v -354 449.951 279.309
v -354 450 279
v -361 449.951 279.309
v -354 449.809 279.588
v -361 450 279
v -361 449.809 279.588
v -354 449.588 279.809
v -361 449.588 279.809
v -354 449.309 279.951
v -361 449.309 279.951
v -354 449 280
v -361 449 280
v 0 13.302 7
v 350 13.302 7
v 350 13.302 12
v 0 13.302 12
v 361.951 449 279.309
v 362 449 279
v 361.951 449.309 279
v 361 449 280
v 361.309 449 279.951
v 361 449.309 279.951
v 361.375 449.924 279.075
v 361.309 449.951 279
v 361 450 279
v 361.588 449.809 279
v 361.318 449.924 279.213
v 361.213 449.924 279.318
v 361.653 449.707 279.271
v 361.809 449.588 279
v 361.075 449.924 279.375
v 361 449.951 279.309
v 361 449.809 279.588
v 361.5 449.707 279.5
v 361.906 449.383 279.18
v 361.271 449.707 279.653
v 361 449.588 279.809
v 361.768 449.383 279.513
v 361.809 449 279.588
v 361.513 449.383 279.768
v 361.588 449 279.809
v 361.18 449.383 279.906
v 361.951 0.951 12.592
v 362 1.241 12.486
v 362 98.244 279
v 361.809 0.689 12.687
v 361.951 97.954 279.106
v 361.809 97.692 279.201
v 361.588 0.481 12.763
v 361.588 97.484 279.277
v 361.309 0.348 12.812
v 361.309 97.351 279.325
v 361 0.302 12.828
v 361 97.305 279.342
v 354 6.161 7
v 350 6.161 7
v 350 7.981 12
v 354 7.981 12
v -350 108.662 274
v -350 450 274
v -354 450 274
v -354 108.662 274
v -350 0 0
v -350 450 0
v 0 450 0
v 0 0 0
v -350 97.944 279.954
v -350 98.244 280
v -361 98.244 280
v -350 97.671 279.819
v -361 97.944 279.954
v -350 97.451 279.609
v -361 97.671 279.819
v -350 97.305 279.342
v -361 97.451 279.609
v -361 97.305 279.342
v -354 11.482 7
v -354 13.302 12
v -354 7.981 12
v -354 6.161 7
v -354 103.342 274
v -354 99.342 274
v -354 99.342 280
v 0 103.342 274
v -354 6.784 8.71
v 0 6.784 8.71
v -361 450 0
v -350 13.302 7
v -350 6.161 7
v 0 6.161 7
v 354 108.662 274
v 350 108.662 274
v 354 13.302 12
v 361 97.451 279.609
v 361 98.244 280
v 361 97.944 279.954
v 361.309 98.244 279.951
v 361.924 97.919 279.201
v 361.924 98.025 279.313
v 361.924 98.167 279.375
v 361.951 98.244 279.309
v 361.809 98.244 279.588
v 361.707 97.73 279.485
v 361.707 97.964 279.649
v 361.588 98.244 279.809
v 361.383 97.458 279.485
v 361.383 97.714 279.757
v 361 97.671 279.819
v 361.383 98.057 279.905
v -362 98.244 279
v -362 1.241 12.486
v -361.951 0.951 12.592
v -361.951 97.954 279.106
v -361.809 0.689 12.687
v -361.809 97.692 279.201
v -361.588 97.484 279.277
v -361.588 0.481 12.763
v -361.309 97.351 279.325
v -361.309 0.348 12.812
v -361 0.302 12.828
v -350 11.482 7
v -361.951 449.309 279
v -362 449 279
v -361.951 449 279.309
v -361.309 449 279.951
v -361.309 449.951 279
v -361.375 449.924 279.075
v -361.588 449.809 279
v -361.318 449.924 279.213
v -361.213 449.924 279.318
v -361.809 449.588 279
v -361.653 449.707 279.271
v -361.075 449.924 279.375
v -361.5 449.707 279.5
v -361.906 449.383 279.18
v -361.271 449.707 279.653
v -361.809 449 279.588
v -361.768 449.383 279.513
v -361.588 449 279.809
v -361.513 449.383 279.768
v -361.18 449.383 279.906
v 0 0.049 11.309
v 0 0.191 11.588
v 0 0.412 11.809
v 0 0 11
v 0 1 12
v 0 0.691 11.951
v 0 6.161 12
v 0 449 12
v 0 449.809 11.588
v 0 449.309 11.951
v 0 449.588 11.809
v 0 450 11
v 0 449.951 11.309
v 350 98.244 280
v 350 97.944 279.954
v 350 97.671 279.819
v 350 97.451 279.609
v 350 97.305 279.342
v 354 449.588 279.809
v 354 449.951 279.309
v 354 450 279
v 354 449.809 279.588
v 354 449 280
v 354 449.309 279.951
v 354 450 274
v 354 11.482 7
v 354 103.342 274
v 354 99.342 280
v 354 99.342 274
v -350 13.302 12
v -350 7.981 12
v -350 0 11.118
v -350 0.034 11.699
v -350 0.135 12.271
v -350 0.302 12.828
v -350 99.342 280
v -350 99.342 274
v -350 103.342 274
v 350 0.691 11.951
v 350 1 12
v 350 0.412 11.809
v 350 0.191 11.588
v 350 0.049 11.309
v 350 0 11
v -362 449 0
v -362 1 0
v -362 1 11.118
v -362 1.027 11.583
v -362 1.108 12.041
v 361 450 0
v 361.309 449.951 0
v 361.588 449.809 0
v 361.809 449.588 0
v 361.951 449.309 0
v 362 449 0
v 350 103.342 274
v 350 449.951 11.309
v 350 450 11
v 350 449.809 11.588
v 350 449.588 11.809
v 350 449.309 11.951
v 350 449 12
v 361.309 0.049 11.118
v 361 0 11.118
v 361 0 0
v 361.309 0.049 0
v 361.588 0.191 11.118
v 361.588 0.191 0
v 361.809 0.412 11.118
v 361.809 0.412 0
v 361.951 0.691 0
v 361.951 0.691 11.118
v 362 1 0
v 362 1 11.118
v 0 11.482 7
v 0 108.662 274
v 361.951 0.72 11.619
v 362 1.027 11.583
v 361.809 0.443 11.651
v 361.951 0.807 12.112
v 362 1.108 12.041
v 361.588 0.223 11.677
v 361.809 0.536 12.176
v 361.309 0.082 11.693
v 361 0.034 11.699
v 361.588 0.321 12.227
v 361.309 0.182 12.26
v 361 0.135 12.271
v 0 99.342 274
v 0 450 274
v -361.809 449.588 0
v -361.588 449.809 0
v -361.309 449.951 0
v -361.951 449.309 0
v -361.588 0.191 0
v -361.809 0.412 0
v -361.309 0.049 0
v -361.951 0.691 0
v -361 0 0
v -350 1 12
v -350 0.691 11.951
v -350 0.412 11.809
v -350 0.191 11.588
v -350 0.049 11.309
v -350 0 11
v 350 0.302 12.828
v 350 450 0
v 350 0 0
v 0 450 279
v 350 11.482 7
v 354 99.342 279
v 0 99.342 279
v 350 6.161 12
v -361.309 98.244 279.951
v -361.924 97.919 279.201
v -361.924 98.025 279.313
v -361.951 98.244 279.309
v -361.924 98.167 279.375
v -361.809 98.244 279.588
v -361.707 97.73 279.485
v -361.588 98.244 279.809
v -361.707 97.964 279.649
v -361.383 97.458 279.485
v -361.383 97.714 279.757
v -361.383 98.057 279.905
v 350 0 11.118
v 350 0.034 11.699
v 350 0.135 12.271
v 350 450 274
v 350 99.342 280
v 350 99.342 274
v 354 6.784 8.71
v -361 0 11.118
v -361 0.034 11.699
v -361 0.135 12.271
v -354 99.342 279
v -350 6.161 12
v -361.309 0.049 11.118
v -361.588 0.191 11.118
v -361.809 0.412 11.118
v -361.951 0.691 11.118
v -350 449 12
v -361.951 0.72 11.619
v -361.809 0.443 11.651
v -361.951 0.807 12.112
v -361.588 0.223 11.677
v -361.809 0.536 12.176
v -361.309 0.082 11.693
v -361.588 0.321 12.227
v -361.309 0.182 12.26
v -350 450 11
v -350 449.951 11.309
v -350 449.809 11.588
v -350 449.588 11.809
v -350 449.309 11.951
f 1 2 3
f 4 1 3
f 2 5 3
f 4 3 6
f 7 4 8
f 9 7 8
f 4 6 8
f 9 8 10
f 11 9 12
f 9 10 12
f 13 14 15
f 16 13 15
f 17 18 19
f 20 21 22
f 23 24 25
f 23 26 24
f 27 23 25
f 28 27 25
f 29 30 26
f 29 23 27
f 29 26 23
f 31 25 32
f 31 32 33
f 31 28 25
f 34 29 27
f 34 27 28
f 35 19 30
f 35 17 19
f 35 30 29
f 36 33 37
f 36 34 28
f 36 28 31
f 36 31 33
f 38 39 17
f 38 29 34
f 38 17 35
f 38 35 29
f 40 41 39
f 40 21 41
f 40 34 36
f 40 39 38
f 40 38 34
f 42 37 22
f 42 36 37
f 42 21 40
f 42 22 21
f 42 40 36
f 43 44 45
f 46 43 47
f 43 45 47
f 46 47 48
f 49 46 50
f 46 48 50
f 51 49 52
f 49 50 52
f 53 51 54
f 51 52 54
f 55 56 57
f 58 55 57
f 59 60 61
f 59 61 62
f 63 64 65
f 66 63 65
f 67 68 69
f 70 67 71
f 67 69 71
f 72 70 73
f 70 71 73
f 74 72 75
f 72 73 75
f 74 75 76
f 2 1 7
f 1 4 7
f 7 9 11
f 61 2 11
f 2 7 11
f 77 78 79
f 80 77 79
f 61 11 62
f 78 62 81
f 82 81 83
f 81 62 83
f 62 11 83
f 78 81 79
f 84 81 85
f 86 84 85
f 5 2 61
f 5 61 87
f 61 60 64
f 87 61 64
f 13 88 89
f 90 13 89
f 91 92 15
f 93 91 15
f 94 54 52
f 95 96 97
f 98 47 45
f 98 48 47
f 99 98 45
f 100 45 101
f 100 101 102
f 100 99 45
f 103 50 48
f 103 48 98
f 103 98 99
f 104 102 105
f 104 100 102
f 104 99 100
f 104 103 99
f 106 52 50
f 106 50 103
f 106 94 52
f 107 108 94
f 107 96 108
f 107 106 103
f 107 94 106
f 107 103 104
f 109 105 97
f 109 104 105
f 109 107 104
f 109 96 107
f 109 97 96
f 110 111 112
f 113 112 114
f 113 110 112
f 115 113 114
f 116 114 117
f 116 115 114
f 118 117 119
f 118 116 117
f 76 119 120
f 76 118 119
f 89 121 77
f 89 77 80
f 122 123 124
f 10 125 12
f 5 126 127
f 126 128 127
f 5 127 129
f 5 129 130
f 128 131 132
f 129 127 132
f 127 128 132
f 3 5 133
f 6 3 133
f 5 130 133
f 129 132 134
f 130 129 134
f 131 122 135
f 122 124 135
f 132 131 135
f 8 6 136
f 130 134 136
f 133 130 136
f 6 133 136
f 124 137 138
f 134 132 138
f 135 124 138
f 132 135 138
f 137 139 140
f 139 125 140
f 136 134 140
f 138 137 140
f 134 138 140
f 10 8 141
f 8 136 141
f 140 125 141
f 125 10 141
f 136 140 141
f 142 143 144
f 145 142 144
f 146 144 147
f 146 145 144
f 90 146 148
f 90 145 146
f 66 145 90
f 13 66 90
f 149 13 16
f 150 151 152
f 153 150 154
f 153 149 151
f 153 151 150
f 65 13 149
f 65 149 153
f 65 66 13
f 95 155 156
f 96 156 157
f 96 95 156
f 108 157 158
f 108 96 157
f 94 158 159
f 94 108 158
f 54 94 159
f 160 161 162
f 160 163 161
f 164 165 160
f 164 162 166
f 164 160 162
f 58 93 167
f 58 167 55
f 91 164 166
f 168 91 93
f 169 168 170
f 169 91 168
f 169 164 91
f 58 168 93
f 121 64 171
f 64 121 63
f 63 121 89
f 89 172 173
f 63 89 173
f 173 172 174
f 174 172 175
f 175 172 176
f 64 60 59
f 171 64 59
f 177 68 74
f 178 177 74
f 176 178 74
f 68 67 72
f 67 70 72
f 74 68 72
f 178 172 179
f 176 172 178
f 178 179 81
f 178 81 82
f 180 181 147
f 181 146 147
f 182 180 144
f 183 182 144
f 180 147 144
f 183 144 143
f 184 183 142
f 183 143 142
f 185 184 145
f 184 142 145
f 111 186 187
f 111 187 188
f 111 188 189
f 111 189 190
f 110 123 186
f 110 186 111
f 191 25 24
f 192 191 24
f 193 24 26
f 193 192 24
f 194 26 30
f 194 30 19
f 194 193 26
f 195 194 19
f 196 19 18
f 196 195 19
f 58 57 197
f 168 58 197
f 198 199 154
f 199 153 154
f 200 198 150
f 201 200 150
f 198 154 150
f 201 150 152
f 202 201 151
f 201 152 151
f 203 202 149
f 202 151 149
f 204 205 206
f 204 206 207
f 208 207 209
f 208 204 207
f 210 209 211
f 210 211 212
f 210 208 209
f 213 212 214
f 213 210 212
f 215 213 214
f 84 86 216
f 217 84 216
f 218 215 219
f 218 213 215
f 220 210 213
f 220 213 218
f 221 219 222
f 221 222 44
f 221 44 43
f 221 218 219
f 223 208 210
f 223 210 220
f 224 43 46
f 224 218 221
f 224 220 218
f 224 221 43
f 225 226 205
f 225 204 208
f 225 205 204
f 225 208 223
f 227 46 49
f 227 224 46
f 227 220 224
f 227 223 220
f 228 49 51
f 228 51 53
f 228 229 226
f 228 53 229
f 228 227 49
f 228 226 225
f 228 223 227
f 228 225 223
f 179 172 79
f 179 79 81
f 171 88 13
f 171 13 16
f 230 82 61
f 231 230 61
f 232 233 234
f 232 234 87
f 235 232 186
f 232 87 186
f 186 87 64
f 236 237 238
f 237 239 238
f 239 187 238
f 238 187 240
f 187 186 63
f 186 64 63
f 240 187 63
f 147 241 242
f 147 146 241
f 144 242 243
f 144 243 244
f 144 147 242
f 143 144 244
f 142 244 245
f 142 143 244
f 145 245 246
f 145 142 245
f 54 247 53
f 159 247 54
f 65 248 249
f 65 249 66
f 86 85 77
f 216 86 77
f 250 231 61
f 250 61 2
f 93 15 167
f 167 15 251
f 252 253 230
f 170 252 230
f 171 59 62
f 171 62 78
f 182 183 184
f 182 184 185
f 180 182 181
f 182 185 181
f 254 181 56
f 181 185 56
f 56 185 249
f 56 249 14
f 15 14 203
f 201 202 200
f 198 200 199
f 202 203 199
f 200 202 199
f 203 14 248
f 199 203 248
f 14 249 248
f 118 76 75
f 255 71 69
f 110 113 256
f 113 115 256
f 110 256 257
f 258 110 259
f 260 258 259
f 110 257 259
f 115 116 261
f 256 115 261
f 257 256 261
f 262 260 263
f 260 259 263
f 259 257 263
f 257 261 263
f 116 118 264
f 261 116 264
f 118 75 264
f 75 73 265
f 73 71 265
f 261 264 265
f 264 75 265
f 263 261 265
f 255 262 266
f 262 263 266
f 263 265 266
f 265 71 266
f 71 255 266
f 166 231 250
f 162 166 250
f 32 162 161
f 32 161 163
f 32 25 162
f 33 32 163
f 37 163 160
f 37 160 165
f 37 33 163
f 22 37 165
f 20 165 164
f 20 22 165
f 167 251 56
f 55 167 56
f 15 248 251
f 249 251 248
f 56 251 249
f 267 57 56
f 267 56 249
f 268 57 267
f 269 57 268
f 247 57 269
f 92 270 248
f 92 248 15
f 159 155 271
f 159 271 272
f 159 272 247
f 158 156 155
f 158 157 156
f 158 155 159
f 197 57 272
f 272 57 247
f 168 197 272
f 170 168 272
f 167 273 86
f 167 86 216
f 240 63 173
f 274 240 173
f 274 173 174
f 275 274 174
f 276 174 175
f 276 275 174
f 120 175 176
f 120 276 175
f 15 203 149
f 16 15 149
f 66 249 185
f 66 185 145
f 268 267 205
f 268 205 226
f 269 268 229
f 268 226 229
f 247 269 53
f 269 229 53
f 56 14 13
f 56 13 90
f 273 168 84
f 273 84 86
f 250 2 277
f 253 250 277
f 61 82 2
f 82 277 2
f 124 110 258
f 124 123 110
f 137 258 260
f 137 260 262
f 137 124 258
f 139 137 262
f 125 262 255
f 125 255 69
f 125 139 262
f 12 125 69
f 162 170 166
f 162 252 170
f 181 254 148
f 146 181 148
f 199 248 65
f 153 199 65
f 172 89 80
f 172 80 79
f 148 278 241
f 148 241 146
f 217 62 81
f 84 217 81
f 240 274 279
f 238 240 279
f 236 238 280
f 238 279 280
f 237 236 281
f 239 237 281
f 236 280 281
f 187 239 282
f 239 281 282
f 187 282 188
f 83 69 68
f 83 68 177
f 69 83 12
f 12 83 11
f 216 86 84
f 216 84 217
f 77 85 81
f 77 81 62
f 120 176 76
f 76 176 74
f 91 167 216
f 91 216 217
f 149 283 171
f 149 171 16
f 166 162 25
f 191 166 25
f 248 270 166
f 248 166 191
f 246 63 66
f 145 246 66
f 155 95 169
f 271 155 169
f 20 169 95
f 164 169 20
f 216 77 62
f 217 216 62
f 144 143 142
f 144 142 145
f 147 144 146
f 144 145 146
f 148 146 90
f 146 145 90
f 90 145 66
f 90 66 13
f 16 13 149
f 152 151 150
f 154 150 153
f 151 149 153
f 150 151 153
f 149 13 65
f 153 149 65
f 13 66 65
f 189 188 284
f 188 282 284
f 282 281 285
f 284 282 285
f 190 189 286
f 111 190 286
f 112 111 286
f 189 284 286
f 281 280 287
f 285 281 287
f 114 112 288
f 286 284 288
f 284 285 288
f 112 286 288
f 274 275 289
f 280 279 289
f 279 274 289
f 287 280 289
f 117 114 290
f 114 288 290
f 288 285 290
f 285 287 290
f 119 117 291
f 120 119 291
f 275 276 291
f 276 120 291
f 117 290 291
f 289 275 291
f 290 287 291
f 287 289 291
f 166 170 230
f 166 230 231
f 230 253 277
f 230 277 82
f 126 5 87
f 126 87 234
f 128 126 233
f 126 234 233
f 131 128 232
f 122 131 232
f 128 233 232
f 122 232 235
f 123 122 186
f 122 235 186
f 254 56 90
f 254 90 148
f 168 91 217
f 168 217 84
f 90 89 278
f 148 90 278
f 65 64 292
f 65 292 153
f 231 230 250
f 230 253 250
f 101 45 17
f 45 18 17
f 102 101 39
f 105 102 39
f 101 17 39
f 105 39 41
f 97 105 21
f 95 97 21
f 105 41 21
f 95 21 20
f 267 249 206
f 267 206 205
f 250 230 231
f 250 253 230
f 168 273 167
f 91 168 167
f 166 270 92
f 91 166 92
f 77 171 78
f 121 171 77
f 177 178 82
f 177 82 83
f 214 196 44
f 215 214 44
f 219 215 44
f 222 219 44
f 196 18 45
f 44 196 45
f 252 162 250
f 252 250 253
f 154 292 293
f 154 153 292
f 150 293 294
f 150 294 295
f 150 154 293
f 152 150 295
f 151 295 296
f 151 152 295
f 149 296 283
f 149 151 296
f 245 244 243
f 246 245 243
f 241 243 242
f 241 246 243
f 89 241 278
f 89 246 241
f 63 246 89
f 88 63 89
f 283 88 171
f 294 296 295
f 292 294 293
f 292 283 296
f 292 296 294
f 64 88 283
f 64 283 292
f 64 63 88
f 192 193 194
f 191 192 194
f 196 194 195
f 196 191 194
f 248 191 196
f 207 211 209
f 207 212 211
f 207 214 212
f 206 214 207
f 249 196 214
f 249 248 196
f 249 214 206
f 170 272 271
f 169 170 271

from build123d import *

# Parameters (mm, degrees)
F2_W         = 350
F2_H         = 450
F3_DEPTH     = 12
F5_DEPTH     = 12
F6_DEPTH     = 4
F8_DEPTH     = 354
F9_DEPTH     = 354
F10_W        = 7.1407400337
F10_H        = 5
F11_DEPTH    = 350.001
F12_R        = 1
F12_2_R      = 1
F13_T1_DEPTH = 14.2040872589
F13_T4_ANGLE = 20


# Not quite as in the source:
# - a fillet or chamfer that OpenCascade refuses, or shapes differently, is made with other operations: its cross-section is extruded or revolved along the edge and cut away or added


with BuildPart() as f3:
    # F2 (on Top) → F3 (new body)
    with BuildSketch(Plane.XY):
        with Locations((-175, 225)):
            Rectangle(F2_W, F2_H)
    extrude(amount=F3_DEPTH)

    # F10 (on face) → F11 (cut, through all)
    with BuildSketch(Plane(origin=(-350, 0, 0), x_dir=(0, -1, 0), z_dir=(-1, 0, 0))):
        with Locations((-9.7318521391, 9.5)):
            Rectangle(F10_W, F10_H)
    extrude(amount=-F11_DEPTH, mode=Mode.SUBTRACT)

    # F12
    f12_edges = [f3.edges().sort_by_distance(p)[0] for p in [
        (-175, 0, 12),
        (-175, 450, 12),
    ]]
    fillet(f12_edges, radius=F12_R)


with BuildPart() as f5:
    # F4 (on face) → F5 (new body)
    with BuildSketch(Plane(origin=(-350, 0, 0), x_dir=(0, -1, 0), z_dir=(-1, 0, 0))):
        Polygon((-450, 12), (-450, 0), (0, 0), (0, 12), (-7.9813332936, 12), (-6.1614821222, 7), (-11.4823709846, 7), (-13.3022221559, 12), align=None)
        Polygon((-7.9813332936, 12), (-13.3022221559, 12), (-11.4823709846, 7), (-6.1614821222, 7), align=None)
        Polygon((-7.9813332936, 12), (0, 12), (-97.5440227833, 280), (-99.3415346713, 280), (-99.3415346713, 274), (-103.3415346713, 274), align=None)
        Polygon((-108.6624235337, 274), (-13.3022221559, 12), (-7.9813332936, 12), (-103.3415346713, 274), align=None)
        Polygon((-450, 274), (-450, 12), (-13.3022221559, 12), (-108.6624235337, 274), align=None)
        Polygon((-99.3415346713, 274), (-99.3415346713, 280), (-105.5253560769, 280), (-103.3415346713, 274), align=None)
        Polygon((-110.8462449393, 280), (-108.6624235337, 274), (-103.3415346713, 274), (-105.5253560769, 280), align=None)
        Polygon((-450, 280), (-450, 274), (-108.6624235337, 274), (-110.8462449393, 280), align=None)
    extrude(amount=F5_DEPTH)

    # F4 (on face) → F6 (cut)
    with BuildSketch(Plane(origin=(-350, 0, 0), x_dir=(0, -1, 0), z_dir=(-1, 0, 0))):
        Polygon((-7.9813332936, 12), (-13.3022221559, 12), (-11.4823709846, 7), (-6.1614821222, 7), align=None)
        Polygon((-108.6624235337, 274), (-13.3022221559, 12), (-7.9813332936, 12), (-103.3415346713, 274), align=None)
        Polygon((-99.3415346713, 274), (-99.3415346713, 280), (-105.5253560769, 280), (-103.3415346713, 274), align=None)
        Polygon((-110.8462449393, 280), (-108.6624235337, 274), (-103.3415346713, 274), (-105.5253560769, 280), align=None)
        Polygon((-450, 280), (-450, 274), (-108.6624235337, 274), (-110.8462449393, 280), align=None)
    extrude(amount=F6_DEPTH, mode=Mode.SUBTRACT)

    # F12#2
    f12_2_edges = [f5.edges().sort_by_distance(p)[0] for p in [
        (-362, 48.772011, 146),
        (-362, 273.772011, 280),
        (-356, 97.544023, 280),
        (-362, 450, 140),
        (-362, 0, 6),
        (-358, 450, 280),
    ]]
    fillet(f12_2_edges, radius=F12_2_R)

    # F13: fillet of radius 5 on 1 edges, made by hand

    # F13_s2 → F13_t1 (cut)
    with BuildSketch(Plane.YZ.offset(-362)):
        with BuildLine():
            ThreePointArc((0, 11.1183650965), (0.0759612349, 11.9866059848), (0.3015368961, 12.8284658131))
            Line((0.3015368961, 12.8284658131), (0, 12))
            Line((0, 12), (0, 11.1183650965))
        make_face()
    extrude(amount=F13_T1_DEPTH, mode=Mode.SUBTRACT)

    # F13_s3 → F13_t4 (revolve, cut)
    with BuildSketch(Plane.XY.offset(11.1183650965)):
        with BuildLine():
            ThreePointArc((-362, 1), (-361.7071067812, 0.2928932188), (-361, 0))
            Line((-361, 0), (-362, 0))
            Line((-362, 0), (-362, 1))
        make_face()
    revolve(axis=Axis((-362, 5, 11.1183650965), (-1, 0, 0)), revolution_arc=F13_T4_ANGLE, mode=Mode.SUBTRACT)


with BuildPart() as f8:
    # F7 (on face) → F8 (new body)
    with BuildSketch(Plane.YZ.offset(-354)):
        Polygon((103.3415346713, 274), (6.7839078807, 8.7101007166), (11.4823709846, 7), (108.6624235337, 274), align=None)
    extrude(amount=F8_DEPTH)


with BuildPart() as f9:
    # F7 (on face) → F9 (new body)
    with BuildSketch(Plane.YZ.offset(-354)):
        Polygon((99.3415346713, 274), (103.3415346713, 274), (108.6624235337, 274), (450, 274), (450, 279), (99.3415346713, 279), align=None)
    extrude(amount=F9_DEPTH)


with BuildPart() as f14_1:
    # F14: instance of F5
    add(f5.part.mirror(Plane(origin=(0, 226.4328970627, 5.9762405928), x_dir=(0, 1, 0), z_dir=(1, 0, 0))))


with BuildPart() as f14_2:
    # F14: instance of F9
    add(f9.part.mirror(Plane(origin=(0, 226.4328970627, 5.9762405928), x_dir=(0, 1, 0), z_dir=(1, 0, 0))))


with BuildPart() as f14_3:
    # F14: instance of F3
    add(f3.part.mirror(Plane(origin=(0, 226.4328970627, 5.9762405928), x_dir=(0, 1, 0), z_dir=(1, 0, 0))))


with BuildPart() as f14_4:
    # F14: instance of F8
    add(f8.part.mirror(Plane(origin=(0, 226.4328970627, 5.9762405928), x_dir=(0, 1, 0), z_dir=(1, 0, 0))))


solid = Compound([f3.part, f5.part, f8.part, f9.part, f14_1.part, f14_2.part, f14_3.part, f14_4.part])
